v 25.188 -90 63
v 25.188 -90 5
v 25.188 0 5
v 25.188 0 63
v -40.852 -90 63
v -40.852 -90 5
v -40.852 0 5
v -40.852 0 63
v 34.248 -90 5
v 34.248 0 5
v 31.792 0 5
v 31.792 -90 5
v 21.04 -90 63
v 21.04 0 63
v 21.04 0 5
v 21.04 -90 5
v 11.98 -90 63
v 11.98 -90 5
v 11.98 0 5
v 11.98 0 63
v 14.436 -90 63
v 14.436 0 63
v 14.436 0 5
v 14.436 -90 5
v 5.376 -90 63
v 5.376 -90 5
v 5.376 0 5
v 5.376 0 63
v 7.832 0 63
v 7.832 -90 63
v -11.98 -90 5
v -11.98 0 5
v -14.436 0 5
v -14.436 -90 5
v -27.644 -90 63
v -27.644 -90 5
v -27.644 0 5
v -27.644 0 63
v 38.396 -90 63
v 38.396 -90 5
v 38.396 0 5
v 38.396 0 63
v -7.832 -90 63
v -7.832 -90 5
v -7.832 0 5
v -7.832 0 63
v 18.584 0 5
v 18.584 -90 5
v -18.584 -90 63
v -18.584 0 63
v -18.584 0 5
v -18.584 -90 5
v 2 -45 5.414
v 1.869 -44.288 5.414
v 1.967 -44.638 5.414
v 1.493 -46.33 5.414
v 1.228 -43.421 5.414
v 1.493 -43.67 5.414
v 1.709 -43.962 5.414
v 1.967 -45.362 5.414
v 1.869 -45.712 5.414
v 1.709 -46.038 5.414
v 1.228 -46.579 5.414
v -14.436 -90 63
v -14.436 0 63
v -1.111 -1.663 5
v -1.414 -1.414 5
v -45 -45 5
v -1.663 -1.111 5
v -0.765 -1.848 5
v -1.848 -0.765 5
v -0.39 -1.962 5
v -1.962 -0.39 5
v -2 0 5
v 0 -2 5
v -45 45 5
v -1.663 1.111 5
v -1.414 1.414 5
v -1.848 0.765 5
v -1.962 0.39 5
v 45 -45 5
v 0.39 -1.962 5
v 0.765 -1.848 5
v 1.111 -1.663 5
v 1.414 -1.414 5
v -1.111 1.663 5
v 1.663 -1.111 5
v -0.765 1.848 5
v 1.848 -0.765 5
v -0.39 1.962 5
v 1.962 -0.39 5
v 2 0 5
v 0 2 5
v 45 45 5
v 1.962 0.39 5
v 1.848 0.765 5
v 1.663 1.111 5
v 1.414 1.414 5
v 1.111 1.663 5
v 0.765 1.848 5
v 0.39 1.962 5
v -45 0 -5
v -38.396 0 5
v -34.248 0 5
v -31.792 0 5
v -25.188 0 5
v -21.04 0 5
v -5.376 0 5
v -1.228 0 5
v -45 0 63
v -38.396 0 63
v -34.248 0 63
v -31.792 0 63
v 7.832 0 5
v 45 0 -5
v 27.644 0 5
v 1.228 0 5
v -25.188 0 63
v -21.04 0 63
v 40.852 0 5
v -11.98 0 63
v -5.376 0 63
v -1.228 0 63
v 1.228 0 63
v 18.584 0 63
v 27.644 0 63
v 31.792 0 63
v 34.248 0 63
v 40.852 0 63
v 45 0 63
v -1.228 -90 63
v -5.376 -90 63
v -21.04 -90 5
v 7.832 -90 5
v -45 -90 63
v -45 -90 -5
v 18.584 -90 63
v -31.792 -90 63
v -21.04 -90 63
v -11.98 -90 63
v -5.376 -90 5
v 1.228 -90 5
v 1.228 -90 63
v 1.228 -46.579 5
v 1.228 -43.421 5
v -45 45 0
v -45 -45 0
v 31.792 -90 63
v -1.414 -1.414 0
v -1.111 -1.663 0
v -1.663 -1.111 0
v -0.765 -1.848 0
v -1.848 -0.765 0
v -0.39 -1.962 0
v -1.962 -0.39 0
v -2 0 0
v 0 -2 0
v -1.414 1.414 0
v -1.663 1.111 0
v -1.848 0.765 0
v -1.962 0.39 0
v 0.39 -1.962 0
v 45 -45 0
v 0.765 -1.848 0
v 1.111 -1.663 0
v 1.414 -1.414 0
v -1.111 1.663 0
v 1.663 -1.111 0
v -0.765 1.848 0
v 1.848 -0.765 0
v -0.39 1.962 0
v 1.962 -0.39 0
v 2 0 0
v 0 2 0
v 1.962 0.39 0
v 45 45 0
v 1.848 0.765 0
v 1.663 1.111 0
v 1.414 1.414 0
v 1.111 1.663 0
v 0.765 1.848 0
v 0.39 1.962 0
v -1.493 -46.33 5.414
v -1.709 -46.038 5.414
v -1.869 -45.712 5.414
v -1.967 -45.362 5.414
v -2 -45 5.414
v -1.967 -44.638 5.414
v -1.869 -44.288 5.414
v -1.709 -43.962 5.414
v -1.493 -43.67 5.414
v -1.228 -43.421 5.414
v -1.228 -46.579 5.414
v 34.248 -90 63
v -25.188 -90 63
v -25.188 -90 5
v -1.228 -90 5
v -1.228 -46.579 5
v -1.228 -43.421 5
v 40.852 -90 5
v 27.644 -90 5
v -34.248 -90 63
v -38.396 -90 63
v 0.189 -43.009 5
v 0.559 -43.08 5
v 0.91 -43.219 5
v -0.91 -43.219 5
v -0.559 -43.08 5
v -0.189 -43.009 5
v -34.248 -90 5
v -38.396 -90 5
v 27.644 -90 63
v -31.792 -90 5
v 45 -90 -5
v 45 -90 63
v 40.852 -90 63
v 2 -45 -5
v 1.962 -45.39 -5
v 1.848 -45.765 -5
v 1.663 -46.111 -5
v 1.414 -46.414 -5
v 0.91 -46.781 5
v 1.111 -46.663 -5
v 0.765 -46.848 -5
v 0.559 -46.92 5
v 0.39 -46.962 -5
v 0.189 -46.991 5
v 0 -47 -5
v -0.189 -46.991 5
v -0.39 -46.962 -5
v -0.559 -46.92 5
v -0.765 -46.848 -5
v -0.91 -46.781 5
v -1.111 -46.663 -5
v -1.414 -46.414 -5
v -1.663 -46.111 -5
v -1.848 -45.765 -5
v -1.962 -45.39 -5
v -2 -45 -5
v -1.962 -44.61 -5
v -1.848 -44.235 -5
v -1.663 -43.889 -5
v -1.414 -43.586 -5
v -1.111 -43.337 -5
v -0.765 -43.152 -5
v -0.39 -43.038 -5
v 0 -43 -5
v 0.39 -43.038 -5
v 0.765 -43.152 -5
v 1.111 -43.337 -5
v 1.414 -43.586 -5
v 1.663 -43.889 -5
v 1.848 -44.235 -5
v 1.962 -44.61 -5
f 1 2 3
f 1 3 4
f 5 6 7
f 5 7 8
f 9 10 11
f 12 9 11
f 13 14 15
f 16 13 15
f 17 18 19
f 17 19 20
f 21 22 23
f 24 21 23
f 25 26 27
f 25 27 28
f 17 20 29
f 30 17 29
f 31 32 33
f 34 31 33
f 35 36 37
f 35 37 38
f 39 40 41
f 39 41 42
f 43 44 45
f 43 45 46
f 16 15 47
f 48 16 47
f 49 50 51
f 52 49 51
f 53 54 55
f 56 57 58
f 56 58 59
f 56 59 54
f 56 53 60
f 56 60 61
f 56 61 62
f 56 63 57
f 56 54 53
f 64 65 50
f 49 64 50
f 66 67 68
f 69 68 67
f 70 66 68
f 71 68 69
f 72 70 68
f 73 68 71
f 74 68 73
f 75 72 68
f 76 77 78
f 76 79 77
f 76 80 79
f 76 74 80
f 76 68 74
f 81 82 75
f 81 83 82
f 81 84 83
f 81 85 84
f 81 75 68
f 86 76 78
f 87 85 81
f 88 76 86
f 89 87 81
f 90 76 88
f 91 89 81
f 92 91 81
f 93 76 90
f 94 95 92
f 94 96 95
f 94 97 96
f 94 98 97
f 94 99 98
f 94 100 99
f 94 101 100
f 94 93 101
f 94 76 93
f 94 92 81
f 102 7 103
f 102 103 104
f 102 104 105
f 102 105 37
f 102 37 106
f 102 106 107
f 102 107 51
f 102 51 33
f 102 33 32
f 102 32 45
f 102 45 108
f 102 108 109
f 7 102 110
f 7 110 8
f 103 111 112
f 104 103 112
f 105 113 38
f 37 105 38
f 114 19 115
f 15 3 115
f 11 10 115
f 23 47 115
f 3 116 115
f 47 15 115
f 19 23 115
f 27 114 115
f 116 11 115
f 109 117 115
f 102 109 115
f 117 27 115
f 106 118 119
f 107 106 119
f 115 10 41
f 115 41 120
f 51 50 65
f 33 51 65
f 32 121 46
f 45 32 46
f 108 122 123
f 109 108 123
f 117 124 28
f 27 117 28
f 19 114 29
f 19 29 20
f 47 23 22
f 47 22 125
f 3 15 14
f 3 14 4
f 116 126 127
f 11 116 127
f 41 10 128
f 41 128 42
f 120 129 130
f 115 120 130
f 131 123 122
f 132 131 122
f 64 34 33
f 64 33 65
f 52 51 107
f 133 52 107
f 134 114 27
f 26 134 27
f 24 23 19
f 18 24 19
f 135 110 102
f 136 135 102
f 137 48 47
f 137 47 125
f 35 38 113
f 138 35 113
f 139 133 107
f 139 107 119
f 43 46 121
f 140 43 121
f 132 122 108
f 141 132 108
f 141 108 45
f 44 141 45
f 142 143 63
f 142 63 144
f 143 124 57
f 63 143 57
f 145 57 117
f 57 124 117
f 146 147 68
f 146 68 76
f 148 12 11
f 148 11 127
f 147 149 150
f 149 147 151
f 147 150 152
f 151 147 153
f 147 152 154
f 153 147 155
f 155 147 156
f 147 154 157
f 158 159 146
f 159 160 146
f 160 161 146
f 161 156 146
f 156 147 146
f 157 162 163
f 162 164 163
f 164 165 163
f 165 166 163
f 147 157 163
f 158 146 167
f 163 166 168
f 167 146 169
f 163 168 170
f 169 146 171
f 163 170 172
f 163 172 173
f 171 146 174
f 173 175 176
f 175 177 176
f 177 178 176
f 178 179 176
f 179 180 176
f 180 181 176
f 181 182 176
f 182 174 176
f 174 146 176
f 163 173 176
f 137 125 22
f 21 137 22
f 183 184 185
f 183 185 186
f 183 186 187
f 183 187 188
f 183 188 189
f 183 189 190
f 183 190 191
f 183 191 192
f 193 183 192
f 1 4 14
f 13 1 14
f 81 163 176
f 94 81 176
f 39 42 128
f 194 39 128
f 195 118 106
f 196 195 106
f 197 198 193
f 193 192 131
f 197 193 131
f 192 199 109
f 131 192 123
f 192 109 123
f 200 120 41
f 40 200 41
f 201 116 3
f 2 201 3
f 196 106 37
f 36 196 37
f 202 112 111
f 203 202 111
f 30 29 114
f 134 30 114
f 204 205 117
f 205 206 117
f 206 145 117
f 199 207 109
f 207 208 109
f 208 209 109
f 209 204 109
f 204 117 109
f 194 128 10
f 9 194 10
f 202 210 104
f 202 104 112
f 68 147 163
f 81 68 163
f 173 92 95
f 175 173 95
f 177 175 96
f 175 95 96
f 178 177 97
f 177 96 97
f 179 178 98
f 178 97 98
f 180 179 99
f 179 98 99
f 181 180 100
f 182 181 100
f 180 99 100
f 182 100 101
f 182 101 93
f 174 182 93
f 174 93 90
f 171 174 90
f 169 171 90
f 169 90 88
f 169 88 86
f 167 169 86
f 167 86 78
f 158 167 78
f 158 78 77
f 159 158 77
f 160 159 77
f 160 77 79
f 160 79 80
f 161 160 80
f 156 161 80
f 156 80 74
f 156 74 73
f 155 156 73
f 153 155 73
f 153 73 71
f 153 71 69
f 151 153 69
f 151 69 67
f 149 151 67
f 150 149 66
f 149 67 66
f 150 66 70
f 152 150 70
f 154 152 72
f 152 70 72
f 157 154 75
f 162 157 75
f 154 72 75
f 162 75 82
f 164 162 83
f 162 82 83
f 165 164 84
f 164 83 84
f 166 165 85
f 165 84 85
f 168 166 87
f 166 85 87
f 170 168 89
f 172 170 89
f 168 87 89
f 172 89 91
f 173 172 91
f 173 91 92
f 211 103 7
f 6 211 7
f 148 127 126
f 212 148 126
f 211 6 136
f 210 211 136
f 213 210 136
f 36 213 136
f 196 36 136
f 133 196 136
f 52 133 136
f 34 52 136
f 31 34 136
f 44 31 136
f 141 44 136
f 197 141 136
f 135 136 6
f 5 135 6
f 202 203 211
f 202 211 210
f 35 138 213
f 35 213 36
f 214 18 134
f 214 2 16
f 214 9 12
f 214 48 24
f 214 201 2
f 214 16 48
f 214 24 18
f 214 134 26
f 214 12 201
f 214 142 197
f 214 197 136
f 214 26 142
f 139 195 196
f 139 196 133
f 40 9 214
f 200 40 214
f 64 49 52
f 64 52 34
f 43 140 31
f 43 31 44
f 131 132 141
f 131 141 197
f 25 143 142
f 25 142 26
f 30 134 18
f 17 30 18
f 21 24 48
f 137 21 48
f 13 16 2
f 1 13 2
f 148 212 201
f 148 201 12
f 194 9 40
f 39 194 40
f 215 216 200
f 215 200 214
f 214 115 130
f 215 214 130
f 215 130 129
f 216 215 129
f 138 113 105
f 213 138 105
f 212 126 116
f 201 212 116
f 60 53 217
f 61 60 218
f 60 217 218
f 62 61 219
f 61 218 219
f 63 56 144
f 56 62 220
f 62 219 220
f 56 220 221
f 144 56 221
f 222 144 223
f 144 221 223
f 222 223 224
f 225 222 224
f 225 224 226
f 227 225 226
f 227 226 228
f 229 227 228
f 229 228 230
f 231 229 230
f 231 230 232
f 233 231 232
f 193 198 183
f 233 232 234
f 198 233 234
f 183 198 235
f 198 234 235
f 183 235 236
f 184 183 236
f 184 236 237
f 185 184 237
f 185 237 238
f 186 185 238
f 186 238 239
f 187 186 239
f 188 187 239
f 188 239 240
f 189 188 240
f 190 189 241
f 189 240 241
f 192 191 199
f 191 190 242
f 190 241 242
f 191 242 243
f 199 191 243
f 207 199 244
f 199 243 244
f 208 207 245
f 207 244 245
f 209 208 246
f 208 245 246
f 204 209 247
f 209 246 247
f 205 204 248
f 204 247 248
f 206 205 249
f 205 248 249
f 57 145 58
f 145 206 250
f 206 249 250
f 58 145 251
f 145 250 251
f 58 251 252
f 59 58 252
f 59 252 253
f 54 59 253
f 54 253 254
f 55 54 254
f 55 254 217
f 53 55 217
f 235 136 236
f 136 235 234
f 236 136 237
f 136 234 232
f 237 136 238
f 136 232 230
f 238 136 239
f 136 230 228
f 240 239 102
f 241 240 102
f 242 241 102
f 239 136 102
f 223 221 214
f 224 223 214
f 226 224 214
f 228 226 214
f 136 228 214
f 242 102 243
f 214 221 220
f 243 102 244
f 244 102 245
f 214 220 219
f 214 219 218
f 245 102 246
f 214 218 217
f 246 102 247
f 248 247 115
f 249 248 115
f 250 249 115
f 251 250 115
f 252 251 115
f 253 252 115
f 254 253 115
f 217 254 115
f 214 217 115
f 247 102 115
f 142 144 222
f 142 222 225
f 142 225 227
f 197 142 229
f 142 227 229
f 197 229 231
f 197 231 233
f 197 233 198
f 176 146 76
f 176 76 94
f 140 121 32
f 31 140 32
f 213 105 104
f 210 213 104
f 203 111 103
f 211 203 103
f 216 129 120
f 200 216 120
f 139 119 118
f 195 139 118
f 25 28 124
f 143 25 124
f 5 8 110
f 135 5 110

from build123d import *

# Parameters (mm, degrees)
F1_DEPTH = 90
F2_R     = 2
F3_DEPTH = 10.414
F4_W     = 90
F4_H     = 90
F5_DEPTH = 5
F6_R     = 2
F7_DEPTH = 25.4


with BuildPart() as f1:
    # F0 (on Front) → F1 (new body)
    with BuildSketch(Plane.XZ):
        Polygon((-45, 5), (-45, -5), (45, -5), (45, 5), (45, 63), (40.852, 63), (40.852, 5), (38.396, 5), (38.396, 63), (34.248, 63), (34.248, 5), (31.792, 5), (31.792, 63), (27.644, 63), (27.644, 5), (25.188, 5), (25.188, 63), (21.04, 63), (21.04, 5), (18.584, 5), (18.584, 63), (14.436, 63), (14.436, 5), (11.98, 5), (11.98, 63), (7.832, 63), (7.832, 5), (5.376, 5), (5.376, 63), (1.228, 63), (1.228, 5), (-1.228, 5), (-1.228, 63), (-5.376, 63), (-5.376, 5), (-7.832, 5), (-7.832, 63), (-11.98, 63), (-11.98, 5), (-14.436, 5), (-14.436, 63), (-18.584, 63), (-18.584, 5), (-21.04, 5), (-21.04, 63), (-25.188, 63), (-25.188, 5), (-27.644, 5), (-27.644, 63), (-31.792, 63), (-31.792, 5), (-34.248, 5), (-34.248, 63), (-38.396, 63), (-38.396, 5), (-40.852, 5), (-40.852, 63), (-45, 63), align=None)
    extrude(amount=F1_DEPTH)

    # F2 (on face) → F3 (cut)
    with BuildSketch(Plane(origin=(0, 0, -5), x_dir=(1, 0, 0), z_dir=(0, 0, -1))):
        with Locations((0, 45)):
            Circle(F2_R)
    extrude(amount=-F3_DEPTH, mode=Mode.SUBTRACT)


with BuildPart() as f5:
    # F4 (on Top) → F5 (new body)
    with BuildSketch(Plane.XY):
        Rectangle(F4_W, F4_H)
    extrude(amount=F5_DEPTH)

    # F6 (on face) → F7 (cut)
    with BuildSketch(Plane.XY.offset(5)):
        Circle(F6_R)
    extrude(amount=-F7_DEPTH, mode=Mode.SUBTRACT)


solid = Compound([f1.part, f5.part])
